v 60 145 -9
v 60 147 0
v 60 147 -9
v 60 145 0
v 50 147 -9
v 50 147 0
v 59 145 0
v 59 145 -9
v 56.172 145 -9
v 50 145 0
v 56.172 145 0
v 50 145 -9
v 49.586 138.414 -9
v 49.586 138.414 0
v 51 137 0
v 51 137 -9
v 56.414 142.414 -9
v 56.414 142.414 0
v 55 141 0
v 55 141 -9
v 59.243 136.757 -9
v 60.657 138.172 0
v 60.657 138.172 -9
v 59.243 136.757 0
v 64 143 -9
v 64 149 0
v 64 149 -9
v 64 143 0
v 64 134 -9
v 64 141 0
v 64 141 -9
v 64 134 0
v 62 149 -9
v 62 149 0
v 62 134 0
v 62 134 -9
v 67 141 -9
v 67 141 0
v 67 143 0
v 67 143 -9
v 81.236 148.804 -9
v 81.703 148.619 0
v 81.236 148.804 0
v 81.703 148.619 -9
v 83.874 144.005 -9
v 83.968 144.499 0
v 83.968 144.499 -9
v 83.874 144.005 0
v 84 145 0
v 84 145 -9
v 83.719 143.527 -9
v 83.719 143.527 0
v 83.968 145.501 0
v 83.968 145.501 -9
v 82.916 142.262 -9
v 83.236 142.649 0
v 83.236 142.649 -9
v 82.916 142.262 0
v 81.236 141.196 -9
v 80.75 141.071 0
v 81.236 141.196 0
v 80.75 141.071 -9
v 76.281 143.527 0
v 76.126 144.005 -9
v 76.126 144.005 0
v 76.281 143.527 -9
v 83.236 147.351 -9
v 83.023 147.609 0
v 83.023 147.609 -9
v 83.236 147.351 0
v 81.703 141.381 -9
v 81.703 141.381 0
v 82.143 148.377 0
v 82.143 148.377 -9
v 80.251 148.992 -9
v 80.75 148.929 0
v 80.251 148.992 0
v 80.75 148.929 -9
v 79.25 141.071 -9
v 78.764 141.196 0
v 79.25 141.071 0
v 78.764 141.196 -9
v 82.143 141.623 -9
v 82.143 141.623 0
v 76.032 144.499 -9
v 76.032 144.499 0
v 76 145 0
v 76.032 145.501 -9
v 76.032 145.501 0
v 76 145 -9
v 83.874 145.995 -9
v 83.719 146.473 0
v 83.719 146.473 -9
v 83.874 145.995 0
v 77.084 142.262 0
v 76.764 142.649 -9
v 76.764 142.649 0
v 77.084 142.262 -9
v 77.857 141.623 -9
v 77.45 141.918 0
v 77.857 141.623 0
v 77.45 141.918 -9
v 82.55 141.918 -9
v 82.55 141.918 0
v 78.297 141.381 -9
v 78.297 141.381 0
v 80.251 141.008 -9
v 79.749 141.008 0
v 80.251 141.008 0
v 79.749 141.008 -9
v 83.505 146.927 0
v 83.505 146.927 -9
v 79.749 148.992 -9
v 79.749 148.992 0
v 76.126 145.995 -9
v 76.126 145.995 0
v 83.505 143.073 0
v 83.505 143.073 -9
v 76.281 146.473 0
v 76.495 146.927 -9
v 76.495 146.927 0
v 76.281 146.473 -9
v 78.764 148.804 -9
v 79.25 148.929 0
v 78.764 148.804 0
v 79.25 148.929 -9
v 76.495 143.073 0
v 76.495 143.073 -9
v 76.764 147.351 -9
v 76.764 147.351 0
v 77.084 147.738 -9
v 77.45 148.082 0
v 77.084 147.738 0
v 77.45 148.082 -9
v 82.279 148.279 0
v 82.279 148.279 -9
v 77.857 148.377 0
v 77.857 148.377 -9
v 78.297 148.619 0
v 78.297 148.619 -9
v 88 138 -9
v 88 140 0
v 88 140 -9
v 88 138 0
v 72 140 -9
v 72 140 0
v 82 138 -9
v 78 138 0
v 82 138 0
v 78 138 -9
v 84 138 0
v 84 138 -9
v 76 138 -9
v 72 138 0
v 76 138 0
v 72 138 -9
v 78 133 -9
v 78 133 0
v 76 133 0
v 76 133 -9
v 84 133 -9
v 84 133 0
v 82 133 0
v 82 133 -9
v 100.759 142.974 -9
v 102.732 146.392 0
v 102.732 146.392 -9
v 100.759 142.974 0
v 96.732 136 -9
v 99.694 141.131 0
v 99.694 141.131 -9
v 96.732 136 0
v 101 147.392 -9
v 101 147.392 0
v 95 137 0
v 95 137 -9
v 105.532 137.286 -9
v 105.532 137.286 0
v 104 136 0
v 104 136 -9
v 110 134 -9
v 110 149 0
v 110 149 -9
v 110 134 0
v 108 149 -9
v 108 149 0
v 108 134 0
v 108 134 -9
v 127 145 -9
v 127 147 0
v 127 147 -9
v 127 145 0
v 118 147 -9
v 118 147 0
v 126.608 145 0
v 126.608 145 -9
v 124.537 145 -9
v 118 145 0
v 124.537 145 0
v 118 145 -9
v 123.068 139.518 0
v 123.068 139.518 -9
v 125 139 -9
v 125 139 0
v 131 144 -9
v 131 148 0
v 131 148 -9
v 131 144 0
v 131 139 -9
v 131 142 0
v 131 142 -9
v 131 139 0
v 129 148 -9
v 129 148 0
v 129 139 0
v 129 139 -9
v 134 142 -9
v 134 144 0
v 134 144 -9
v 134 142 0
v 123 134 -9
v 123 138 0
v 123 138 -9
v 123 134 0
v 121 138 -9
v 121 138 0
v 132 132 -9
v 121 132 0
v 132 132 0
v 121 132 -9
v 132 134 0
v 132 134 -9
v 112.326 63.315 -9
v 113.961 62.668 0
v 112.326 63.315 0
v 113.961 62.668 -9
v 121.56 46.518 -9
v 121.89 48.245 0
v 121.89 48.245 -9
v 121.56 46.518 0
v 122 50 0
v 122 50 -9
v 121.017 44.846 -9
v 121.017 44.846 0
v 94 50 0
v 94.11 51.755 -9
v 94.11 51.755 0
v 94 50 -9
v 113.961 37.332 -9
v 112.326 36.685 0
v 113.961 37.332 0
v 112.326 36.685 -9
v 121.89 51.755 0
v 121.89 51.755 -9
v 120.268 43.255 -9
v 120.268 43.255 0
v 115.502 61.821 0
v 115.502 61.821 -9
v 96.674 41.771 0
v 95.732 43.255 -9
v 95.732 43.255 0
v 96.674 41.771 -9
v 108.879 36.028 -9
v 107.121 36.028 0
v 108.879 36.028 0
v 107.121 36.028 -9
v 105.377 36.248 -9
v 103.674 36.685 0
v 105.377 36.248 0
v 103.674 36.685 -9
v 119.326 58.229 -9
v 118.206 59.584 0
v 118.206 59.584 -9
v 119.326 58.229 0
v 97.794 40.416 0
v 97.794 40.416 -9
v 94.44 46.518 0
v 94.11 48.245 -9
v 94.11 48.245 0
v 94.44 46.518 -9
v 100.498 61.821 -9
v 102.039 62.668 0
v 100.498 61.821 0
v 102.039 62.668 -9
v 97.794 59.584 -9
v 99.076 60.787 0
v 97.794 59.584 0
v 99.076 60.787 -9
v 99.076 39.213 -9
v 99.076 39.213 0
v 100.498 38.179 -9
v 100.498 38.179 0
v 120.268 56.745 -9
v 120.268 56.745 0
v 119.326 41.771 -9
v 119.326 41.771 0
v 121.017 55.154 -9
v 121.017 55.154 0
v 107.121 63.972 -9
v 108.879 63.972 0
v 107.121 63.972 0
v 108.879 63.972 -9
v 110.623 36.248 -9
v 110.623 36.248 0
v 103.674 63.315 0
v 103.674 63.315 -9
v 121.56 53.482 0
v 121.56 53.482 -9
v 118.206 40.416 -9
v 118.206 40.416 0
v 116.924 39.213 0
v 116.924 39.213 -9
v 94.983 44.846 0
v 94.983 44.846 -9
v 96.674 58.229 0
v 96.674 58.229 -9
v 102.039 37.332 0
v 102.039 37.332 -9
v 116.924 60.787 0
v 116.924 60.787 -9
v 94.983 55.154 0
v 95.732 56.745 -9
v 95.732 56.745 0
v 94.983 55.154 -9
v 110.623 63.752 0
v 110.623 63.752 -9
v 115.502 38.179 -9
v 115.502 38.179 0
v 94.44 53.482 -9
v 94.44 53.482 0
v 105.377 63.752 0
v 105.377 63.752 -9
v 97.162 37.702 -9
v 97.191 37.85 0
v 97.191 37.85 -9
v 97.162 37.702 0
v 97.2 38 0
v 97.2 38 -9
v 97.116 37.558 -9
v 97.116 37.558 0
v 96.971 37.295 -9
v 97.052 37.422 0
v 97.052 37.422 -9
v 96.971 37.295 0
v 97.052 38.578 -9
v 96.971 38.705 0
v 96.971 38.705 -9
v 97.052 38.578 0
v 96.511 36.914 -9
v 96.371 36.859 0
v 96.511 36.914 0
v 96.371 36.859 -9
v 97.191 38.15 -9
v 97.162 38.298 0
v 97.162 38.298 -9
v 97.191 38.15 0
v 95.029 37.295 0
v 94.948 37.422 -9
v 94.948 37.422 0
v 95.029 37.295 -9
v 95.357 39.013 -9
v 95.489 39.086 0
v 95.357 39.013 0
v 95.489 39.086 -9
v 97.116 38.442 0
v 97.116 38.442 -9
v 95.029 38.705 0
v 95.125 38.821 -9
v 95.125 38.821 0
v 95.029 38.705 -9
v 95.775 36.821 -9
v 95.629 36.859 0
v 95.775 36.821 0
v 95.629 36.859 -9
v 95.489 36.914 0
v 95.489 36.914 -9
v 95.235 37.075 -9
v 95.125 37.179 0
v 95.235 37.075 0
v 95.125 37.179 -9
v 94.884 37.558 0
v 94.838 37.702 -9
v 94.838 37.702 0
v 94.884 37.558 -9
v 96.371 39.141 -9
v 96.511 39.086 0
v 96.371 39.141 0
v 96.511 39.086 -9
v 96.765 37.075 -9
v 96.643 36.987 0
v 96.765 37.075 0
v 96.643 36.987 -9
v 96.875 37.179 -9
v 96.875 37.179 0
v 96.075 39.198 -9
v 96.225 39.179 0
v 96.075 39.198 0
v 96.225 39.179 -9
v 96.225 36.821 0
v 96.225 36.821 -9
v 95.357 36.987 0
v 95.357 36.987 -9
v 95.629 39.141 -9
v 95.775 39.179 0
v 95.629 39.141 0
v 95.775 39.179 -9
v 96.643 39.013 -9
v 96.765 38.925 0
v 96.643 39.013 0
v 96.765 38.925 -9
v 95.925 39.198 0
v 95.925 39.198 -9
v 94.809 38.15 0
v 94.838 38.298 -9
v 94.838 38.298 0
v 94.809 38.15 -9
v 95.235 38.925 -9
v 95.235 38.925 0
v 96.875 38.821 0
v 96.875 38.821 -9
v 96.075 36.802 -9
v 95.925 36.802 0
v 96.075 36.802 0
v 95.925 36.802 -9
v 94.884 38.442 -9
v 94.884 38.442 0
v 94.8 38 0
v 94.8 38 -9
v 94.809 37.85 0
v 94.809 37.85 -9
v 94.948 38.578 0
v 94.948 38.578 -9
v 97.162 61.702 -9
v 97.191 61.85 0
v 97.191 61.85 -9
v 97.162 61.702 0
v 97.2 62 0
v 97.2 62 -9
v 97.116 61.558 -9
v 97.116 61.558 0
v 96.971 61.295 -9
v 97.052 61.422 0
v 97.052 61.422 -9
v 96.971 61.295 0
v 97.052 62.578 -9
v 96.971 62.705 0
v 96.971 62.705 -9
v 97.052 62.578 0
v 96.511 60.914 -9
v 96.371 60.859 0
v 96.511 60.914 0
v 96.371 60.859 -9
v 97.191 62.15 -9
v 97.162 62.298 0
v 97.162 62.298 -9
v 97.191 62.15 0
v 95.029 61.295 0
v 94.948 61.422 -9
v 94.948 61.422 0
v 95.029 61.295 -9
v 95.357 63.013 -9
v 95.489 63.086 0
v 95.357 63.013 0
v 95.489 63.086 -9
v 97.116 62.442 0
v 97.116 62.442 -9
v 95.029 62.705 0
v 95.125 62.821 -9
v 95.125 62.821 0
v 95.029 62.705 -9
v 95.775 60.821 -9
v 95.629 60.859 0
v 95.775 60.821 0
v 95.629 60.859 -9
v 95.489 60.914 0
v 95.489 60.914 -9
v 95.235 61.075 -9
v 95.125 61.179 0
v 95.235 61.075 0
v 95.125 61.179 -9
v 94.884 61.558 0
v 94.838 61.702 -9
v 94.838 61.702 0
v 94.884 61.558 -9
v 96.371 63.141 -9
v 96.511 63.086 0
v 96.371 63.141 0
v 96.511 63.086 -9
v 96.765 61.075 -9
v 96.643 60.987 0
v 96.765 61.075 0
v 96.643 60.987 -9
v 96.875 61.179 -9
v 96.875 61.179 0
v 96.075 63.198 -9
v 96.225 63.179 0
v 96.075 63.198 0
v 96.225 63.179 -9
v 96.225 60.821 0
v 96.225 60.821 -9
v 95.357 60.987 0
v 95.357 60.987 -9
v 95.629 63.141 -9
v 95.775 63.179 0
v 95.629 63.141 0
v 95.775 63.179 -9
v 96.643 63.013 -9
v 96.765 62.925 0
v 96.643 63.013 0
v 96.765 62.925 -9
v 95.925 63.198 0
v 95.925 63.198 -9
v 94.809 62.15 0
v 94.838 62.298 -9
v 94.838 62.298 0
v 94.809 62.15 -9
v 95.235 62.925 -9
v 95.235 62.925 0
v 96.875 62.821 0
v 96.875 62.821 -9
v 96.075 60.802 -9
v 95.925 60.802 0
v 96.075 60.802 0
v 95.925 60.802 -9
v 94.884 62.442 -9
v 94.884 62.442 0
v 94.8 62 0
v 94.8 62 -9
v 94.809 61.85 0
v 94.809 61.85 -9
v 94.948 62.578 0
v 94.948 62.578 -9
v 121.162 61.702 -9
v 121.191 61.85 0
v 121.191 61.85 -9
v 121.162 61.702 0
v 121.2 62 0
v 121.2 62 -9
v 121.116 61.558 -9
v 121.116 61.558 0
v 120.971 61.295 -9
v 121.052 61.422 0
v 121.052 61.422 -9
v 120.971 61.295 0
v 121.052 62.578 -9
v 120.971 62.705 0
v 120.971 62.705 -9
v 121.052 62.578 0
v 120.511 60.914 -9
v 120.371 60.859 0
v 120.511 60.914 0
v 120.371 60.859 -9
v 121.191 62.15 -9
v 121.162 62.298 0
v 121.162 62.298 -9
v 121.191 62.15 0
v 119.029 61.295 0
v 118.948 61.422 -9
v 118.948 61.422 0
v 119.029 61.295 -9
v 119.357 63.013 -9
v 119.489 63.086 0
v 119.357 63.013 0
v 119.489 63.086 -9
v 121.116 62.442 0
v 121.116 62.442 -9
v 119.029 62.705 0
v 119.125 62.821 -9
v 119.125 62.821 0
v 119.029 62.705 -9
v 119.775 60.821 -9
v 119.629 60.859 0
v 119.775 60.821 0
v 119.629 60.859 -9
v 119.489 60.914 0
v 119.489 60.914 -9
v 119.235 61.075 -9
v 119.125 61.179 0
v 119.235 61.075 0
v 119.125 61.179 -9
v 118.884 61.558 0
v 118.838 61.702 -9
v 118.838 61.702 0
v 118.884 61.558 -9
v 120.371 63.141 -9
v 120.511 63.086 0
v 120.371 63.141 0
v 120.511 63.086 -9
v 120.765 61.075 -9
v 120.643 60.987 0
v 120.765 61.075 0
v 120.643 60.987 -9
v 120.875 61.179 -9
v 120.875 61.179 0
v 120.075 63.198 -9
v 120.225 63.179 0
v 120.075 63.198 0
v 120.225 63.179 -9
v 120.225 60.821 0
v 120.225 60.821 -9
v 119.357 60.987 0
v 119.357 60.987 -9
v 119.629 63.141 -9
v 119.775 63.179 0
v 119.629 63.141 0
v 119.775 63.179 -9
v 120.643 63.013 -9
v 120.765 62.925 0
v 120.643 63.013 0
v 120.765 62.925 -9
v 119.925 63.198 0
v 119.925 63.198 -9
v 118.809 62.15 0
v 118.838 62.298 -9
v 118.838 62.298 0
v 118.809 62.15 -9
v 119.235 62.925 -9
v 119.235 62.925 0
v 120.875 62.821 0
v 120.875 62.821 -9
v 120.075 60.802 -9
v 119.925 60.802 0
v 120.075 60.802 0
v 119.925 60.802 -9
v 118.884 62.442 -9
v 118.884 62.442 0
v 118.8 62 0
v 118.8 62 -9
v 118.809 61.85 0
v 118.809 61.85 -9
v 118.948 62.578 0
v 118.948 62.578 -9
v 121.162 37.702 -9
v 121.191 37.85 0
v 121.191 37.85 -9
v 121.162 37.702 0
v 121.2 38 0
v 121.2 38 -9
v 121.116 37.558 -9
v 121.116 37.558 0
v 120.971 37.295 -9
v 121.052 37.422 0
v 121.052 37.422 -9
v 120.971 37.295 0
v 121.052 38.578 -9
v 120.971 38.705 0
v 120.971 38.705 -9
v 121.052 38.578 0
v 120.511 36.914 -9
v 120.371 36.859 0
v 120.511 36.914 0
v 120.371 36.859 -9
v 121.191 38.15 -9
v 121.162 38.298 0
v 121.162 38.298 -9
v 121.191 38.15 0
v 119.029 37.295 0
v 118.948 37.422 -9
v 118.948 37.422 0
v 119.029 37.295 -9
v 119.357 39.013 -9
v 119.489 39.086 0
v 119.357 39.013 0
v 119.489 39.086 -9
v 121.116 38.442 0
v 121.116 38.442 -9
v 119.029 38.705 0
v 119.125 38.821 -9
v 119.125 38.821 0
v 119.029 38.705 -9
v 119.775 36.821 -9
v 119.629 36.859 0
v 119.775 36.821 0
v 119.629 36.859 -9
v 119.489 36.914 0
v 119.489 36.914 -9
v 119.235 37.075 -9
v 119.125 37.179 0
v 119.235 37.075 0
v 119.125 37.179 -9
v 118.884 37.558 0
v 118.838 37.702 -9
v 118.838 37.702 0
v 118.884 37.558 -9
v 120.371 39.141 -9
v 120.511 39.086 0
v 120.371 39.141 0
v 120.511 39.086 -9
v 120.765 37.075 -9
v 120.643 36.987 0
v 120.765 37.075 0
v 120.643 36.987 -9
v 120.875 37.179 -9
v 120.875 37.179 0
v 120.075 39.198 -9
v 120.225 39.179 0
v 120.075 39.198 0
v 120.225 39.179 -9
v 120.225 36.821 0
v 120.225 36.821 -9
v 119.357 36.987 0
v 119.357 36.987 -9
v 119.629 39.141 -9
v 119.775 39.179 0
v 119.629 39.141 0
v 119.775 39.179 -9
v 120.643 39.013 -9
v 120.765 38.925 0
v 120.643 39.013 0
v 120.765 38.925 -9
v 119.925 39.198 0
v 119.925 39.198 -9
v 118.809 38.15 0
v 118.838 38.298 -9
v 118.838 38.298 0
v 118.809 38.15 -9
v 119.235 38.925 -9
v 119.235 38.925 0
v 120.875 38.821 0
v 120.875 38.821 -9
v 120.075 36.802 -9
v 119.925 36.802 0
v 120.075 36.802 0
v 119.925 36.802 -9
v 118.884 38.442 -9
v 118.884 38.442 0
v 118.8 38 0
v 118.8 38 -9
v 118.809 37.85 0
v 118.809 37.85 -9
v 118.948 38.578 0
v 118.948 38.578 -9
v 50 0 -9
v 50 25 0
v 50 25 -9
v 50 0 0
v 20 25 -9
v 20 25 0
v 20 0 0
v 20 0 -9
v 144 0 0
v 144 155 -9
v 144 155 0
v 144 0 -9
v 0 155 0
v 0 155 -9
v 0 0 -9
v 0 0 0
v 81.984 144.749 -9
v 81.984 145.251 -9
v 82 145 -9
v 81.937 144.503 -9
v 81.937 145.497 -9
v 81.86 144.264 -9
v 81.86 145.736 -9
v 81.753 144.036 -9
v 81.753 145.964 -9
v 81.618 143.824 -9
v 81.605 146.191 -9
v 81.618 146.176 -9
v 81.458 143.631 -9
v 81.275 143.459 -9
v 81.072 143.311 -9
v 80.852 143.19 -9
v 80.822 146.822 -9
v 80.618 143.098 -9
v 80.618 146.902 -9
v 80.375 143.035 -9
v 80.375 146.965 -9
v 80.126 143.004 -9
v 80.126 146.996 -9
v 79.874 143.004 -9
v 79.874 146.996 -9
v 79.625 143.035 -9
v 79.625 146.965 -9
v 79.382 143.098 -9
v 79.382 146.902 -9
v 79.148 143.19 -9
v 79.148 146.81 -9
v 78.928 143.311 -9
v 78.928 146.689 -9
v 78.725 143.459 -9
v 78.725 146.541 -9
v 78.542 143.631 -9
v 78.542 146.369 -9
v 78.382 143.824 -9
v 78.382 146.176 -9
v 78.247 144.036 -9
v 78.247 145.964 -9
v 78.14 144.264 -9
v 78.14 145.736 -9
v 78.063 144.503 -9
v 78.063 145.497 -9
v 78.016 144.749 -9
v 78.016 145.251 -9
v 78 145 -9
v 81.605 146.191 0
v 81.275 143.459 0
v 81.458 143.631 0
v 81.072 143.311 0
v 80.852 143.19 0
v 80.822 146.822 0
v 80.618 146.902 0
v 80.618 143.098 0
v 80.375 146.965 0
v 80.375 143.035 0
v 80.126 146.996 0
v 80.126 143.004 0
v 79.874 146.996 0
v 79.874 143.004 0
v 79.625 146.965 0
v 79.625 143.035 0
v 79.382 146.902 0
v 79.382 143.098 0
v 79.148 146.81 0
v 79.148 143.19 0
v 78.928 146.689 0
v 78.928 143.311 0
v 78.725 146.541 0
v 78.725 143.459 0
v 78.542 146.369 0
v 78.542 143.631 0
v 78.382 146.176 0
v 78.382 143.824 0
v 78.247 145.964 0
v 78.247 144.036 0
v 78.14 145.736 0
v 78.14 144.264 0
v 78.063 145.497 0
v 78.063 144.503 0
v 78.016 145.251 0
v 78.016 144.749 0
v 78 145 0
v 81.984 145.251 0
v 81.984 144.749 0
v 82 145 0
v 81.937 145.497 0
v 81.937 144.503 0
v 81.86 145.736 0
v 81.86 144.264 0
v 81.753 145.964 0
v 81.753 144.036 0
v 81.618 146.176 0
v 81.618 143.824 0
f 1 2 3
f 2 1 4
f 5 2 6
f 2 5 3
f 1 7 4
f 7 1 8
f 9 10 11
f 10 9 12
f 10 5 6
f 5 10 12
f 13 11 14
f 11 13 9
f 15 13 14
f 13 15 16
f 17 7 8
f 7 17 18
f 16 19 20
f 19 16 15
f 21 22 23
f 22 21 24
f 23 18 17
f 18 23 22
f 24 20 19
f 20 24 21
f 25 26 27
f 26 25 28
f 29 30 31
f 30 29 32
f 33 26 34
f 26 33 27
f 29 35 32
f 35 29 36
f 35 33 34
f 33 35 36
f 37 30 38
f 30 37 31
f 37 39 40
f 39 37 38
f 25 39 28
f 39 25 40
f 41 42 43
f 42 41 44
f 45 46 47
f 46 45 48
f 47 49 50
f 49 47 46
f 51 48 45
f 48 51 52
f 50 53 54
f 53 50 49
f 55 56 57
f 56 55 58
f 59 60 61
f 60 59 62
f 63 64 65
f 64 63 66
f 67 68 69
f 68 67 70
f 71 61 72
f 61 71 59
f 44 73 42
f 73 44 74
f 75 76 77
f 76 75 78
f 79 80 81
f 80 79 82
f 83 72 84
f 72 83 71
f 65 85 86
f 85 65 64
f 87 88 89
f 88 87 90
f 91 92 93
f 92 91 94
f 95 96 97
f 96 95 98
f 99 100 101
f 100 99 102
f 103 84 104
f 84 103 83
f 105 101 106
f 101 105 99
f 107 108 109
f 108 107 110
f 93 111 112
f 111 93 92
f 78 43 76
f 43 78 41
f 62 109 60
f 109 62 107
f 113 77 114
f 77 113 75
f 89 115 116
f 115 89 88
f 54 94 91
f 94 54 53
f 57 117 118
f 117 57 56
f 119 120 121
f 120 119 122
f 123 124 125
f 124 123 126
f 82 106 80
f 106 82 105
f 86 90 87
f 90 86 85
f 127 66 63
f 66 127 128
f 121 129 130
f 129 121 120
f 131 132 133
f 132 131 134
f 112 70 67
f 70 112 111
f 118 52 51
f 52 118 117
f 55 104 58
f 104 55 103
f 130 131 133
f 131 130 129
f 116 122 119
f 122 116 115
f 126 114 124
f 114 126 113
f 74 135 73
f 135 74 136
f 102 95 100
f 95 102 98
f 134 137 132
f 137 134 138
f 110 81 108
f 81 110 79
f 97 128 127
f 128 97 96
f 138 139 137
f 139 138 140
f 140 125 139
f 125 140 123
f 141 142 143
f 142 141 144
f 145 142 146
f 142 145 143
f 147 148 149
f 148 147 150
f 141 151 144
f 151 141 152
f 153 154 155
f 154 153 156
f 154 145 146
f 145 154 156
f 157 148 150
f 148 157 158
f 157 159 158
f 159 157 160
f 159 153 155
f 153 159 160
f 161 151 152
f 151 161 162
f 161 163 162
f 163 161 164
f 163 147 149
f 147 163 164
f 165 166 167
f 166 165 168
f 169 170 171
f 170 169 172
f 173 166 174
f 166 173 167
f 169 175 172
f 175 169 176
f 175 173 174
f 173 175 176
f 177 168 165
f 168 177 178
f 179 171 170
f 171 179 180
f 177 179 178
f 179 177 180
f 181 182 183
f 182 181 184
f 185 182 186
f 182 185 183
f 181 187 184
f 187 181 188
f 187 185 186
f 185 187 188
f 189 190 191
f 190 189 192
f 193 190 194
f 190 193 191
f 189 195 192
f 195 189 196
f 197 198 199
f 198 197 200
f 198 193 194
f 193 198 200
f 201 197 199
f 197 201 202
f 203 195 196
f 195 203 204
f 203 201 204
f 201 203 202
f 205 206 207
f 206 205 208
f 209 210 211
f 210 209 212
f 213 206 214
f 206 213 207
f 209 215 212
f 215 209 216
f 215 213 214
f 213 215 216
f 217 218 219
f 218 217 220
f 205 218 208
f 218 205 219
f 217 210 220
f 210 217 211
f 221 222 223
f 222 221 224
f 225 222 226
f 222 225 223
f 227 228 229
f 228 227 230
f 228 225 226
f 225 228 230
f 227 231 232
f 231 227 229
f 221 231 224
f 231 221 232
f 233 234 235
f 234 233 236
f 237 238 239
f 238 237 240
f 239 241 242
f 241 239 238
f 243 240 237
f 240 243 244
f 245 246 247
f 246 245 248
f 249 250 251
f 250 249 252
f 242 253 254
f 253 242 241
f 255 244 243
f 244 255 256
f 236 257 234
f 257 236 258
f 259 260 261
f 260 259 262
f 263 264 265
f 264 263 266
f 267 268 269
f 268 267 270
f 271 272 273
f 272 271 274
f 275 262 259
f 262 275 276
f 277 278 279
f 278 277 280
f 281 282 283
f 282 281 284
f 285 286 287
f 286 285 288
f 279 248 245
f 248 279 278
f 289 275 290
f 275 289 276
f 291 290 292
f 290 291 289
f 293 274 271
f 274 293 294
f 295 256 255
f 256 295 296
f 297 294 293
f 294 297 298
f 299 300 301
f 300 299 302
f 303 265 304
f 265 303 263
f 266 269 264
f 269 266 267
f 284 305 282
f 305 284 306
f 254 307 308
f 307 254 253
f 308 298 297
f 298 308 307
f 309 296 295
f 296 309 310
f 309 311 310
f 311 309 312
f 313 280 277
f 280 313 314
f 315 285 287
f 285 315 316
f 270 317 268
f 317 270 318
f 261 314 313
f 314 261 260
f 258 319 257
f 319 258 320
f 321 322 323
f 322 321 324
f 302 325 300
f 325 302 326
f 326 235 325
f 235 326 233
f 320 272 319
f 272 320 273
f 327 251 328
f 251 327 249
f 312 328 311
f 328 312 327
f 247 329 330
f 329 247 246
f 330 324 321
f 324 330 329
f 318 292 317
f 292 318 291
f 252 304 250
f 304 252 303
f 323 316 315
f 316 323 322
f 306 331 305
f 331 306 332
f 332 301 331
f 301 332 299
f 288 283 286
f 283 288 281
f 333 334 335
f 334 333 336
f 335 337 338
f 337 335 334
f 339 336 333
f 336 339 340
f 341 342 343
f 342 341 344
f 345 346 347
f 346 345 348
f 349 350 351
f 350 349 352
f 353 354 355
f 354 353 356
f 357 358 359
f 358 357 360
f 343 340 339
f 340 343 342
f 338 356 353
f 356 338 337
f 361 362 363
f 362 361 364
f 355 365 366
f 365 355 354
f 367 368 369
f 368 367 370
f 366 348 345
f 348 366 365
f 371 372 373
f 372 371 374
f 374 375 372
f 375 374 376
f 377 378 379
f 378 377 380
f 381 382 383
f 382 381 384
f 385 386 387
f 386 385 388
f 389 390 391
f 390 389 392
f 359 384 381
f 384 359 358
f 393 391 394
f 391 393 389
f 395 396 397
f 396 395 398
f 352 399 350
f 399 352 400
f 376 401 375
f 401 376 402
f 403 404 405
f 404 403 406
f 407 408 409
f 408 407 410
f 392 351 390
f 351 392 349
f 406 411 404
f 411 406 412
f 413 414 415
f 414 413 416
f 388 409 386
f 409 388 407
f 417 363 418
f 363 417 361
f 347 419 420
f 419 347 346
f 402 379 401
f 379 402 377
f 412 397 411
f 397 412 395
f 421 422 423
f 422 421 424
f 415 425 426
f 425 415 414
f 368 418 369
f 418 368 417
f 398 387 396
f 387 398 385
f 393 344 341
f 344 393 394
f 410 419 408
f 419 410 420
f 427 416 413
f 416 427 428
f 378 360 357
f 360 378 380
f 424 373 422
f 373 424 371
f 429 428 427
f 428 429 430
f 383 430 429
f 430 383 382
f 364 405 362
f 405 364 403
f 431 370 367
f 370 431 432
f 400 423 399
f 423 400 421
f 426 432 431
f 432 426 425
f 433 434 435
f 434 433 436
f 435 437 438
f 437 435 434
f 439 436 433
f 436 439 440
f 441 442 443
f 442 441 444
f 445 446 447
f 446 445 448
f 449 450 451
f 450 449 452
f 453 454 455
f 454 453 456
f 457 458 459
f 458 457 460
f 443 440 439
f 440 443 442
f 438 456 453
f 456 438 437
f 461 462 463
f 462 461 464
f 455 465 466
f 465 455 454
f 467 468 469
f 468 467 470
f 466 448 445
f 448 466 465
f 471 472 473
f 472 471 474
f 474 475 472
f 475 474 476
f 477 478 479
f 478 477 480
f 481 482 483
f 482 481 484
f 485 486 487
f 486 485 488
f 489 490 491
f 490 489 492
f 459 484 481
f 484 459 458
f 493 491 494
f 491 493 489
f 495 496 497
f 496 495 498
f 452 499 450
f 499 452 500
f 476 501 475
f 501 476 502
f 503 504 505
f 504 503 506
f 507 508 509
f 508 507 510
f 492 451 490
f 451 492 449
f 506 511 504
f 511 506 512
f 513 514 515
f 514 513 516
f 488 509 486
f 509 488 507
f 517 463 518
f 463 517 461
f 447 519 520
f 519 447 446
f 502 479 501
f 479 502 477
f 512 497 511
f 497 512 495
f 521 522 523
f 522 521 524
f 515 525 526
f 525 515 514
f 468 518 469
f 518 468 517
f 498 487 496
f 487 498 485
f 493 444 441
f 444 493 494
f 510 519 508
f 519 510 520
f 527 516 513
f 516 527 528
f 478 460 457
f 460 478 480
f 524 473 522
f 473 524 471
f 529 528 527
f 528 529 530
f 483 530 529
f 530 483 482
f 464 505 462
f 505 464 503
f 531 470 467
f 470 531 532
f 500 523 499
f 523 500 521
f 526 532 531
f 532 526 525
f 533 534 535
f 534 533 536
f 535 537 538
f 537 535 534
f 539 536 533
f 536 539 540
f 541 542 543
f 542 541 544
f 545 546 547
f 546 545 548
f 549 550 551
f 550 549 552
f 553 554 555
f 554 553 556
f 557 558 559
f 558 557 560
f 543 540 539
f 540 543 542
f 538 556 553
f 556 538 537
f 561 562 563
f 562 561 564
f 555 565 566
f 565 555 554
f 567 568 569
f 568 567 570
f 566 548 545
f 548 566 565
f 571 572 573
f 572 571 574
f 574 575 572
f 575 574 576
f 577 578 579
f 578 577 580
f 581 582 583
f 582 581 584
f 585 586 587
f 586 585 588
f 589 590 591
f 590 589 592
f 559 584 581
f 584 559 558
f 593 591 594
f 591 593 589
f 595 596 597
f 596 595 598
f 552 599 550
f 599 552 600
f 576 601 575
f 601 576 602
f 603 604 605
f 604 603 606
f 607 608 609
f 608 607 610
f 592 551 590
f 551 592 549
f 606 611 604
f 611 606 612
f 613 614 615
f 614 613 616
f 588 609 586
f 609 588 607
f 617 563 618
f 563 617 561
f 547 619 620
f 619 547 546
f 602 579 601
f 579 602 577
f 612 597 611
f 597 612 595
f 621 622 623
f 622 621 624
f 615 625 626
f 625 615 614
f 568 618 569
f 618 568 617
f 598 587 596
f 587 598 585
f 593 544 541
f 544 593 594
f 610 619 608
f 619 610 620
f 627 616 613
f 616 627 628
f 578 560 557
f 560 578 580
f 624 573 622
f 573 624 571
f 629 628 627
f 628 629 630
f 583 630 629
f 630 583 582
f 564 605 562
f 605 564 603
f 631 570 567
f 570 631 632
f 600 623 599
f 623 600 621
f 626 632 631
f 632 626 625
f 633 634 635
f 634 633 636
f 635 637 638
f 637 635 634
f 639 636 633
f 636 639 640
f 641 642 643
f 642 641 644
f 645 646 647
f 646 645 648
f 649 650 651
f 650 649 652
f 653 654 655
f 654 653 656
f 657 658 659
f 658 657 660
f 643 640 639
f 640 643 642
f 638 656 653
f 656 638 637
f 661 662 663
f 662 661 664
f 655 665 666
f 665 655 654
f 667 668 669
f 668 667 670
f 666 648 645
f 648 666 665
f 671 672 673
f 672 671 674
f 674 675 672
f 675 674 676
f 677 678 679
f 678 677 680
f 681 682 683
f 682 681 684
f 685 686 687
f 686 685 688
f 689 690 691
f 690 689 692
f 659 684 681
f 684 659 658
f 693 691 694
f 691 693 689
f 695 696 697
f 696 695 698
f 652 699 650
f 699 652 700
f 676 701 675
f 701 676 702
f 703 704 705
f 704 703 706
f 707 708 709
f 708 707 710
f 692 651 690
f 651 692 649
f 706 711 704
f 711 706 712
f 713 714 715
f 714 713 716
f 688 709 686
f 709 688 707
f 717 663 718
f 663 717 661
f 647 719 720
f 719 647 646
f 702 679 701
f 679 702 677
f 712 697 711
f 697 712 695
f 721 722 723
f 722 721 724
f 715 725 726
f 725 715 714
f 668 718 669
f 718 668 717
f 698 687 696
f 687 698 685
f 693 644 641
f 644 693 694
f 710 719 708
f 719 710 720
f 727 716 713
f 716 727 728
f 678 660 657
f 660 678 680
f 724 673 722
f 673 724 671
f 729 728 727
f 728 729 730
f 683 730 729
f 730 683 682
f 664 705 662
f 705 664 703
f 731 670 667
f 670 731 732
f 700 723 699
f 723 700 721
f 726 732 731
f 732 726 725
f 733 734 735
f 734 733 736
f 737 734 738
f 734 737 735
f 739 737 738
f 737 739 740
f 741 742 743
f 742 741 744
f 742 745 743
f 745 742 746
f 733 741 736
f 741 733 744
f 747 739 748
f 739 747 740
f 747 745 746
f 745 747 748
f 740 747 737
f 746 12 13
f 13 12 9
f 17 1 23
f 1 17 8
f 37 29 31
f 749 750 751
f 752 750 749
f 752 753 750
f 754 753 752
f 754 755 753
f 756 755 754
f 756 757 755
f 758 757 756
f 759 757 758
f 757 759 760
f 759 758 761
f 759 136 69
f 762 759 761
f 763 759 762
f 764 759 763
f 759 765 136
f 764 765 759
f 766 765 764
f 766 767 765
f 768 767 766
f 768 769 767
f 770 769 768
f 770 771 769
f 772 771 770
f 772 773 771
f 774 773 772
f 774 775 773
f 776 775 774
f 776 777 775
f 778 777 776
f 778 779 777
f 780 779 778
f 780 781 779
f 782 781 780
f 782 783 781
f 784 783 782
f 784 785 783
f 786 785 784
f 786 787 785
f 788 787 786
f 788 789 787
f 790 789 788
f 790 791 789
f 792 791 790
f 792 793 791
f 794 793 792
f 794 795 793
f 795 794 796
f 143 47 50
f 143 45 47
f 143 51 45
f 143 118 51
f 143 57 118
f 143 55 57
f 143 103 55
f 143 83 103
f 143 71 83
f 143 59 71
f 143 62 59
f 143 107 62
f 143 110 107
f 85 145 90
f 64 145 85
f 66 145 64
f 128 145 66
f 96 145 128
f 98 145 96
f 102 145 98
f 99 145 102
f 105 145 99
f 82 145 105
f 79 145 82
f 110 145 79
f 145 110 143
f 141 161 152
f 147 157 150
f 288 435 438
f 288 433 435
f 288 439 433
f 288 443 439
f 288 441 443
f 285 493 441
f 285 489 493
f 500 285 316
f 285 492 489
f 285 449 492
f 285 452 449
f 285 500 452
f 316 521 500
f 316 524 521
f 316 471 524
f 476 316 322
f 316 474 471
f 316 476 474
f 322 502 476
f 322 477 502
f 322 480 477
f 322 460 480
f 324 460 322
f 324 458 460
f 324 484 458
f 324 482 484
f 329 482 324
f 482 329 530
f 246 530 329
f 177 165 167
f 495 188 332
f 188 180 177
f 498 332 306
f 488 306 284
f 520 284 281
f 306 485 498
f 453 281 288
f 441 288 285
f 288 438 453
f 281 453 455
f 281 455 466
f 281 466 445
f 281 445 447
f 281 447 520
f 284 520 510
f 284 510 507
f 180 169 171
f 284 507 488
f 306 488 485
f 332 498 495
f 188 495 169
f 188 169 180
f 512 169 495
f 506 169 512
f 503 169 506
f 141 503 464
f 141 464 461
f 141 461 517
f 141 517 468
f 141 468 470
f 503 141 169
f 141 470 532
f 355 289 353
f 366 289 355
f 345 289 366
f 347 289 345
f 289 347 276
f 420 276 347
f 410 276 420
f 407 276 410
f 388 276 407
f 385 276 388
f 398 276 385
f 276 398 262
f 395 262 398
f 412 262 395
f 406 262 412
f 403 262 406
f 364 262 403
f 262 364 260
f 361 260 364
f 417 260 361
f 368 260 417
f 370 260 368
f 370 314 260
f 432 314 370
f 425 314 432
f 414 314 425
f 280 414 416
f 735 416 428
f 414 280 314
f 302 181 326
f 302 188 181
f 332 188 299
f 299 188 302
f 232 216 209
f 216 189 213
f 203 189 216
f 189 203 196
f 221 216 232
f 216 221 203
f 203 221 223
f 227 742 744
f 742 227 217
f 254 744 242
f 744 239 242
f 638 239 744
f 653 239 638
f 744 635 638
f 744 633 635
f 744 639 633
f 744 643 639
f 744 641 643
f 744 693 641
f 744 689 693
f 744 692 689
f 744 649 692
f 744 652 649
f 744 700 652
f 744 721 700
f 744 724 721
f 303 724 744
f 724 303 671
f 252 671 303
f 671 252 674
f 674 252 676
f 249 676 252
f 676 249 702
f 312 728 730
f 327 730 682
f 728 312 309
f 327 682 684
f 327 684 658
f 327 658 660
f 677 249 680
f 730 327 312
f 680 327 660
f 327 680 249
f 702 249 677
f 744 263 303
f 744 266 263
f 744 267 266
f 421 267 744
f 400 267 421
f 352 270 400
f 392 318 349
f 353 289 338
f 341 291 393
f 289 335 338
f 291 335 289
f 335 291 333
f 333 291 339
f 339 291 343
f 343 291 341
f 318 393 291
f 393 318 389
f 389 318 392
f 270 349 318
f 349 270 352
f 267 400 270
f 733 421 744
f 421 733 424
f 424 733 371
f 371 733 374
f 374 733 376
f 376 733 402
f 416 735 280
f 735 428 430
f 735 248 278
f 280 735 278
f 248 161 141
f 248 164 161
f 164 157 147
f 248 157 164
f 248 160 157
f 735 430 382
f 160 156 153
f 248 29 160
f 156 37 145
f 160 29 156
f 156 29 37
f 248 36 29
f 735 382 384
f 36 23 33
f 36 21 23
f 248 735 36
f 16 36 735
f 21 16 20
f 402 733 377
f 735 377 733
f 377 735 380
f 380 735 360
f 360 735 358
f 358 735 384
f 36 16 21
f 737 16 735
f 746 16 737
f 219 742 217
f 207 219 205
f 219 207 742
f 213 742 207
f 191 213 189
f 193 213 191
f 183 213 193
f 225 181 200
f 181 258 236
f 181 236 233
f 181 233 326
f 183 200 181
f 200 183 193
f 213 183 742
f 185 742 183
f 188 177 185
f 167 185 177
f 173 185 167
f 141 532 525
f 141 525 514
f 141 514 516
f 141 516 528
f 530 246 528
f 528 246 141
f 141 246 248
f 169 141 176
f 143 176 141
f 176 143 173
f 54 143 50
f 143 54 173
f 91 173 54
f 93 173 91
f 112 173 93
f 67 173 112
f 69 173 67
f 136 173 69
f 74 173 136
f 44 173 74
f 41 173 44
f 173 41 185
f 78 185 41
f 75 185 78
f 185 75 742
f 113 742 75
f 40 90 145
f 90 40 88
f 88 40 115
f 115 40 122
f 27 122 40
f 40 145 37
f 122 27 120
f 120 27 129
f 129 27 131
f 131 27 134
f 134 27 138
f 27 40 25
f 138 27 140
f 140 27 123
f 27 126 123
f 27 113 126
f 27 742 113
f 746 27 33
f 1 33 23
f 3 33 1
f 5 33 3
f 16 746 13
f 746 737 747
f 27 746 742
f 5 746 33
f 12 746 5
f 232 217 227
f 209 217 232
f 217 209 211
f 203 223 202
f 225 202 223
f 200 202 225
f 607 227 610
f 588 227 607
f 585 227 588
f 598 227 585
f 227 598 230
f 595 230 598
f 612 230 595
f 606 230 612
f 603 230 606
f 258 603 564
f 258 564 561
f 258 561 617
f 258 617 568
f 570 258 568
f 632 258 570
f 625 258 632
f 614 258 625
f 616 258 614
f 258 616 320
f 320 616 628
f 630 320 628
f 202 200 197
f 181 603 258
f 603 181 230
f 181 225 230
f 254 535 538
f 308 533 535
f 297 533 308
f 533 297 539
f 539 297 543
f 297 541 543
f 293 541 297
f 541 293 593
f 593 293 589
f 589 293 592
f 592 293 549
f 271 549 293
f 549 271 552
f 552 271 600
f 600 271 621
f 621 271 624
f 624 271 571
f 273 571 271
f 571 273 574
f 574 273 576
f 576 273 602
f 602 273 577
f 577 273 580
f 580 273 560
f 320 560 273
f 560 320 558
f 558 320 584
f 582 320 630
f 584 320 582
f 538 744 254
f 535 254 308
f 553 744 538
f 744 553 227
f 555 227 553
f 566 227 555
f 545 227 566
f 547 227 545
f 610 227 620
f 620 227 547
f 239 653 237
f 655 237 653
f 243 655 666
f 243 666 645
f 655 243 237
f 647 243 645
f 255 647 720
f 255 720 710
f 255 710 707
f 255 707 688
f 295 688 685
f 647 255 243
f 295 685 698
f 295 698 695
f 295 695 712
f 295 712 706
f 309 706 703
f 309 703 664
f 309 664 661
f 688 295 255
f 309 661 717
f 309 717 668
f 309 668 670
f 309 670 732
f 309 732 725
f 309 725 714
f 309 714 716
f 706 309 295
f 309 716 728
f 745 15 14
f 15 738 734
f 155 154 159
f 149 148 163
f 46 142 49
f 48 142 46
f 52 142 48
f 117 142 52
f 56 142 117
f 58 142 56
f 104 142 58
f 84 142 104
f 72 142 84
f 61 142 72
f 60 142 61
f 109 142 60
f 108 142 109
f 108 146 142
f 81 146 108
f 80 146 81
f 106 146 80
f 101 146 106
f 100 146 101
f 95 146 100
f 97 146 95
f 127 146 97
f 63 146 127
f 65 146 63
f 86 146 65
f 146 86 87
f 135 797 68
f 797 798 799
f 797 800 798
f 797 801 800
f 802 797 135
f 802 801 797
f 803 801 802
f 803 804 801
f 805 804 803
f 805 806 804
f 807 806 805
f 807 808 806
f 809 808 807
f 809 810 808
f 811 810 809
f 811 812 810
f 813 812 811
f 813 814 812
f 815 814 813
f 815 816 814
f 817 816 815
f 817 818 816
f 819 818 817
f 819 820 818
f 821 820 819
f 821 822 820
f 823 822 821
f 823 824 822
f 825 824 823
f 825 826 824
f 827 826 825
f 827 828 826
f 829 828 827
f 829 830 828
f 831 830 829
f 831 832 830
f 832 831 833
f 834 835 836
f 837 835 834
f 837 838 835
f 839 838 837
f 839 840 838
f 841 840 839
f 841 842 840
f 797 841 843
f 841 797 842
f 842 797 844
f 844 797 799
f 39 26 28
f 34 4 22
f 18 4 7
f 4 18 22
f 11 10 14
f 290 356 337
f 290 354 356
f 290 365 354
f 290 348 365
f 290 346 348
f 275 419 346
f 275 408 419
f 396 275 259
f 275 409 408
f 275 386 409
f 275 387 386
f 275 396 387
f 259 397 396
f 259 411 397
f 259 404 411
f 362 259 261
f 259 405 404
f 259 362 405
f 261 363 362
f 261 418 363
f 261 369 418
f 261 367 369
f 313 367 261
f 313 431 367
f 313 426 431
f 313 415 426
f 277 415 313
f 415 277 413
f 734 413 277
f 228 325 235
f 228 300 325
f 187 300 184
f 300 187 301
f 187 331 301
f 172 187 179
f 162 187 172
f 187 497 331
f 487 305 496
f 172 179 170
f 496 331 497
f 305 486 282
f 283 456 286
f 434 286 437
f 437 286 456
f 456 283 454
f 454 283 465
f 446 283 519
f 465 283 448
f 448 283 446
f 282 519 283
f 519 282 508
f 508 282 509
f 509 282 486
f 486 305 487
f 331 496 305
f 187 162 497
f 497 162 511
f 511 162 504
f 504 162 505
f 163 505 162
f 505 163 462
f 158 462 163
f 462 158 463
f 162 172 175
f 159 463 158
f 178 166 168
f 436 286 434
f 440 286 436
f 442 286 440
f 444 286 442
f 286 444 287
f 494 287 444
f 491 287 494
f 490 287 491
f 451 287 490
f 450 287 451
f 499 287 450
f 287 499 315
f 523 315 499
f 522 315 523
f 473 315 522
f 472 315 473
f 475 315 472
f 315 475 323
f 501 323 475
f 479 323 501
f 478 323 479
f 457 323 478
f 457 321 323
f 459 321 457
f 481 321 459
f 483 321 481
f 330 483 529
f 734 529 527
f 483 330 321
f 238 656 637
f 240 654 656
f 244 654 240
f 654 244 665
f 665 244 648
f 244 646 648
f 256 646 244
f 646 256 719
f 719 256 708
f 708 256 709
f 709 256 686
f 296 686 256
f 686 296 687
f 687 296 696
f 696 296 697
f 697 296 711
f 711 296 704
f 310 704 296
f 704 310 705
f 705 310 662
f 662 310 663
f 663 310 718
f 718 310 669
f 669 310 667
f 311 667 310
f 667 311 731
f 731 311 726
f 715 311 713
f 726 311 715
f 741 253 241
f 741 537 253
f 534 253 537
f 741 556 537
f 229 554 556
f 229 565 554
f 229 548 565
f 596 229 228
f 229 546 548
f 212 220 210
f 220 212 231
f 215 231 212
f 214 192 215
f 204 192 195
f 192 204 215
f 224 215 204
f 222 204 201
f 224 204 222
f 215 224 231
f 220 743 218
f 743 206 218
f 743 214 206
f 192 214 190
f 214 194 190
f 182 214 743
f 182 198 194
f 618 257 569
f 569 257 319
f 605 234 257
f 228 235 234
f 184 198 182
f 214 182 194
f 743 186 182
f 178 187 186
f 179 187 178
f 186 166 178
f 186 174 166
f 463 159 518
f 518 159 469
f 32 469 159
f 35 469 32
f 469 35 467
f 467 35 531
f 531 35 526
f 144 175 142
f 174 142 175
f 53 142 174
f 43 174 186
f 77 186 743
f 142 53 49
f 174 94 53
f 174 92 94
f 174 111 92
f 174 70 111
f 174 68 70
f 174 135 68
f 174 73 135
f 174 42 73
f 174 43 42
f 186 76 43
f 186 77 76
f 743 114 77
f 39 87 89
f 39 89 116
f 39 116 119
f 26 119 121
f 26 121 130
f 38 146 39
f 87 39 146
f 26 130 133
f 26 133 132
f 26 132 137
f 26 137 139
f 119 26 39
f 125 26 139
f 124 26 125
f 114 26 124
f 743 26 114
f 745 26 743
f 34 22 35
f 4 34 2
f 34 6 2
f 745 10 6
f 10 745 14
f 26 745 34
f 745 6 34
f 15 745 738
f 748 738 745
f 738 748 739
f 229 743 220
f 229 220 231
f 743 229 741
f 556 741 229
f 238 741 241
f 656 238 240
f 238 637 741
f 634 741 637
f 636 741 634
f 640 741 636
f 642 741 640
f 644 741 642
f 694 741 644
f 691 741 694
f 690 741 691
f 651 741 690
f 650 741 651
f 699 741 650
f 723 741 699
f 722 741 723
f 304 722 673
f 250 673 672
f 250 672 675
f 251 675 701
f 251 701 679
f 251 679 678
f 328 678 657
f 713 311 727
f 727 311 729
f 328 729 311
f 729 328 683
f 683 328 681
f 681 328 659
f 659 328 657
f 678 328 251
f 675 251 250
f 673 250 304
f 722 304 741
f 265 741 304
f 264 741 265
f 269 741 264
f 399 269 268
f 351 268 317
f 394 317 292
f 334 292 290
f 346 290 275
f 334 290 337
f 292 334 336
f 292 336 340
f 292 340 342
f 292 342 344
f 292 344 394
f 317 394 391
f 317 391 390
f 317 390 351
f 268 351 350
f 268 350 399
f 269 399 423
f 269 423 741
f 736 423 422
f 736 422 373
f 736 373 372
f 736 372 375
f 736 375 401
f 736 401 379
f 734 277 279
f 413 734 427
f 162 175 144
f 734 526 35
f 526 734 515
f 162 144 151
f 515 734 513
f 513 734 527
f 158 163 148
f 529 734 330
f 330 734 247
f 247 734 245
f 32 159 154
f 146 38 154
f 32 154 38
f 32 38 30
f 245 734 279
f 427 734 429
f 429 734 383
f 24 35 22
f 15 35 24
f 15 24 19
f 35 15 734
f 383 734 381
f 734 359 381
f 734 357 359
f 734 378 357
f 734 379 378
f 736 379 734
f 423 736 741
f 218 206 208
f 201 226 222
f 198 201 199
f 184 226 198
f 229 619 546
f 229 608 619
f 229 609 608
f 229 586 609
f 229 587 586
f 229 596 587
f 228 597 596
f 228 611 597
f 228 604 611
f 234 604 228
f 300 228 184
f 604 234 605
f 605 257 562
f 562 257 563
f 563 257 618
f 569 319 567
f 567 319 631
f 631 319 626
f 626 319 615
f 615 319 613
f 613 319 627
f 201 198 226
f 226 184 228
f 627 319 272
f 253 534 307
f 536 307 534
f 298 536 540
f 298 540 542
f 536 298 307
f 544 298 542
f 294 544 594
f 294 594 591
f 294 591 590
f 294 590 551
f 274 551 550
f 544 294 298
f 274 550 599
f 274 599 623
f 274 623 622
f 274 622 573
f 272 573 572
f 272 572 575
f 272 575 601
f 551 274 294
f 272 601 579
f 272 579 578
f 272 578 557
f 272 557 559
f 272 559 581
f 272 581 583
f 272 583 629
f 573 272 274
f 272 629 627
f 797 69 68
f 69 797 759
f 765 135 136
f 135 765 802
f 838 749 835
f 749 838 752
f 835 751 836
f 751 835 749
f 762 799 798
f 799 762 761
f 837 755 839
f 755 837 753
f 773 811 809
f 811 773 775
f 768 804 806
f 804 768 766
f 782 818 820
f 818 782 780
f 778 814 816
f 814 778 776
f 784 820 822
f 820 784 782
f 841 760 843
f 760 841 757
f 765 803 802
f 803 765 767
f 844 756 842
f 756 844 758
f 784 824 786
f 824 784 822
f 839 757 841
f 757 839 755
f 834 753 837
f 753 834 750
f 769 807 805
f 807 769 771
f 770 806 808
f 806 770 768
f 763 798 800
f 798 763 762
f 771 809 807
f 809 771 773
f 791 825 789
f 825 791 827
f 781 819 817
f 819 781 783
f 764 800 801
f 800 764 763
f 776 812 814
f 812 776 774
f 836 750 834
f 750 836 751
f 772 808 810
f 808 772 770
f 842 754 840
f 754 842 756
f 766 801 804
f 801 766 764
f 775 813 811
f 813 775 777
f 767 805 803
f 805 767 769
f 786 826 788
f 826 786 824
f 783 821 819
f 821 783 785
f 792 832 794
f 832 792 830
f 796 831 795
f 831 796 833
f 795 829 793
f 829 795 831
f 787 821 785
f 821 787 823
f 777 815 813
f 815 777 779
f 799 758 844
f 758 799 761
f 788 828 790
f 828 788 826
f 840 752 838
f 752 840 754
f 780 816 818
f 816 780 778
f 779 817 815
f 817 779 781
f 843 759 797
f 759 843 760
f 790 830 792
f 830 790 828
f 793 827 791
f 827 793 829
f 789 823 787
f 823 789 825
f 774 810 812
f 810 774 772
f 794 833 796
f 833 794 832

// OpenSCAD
rotate(a=90,v=[-1,0,0]) {
difference() {
    cube([144,9,155]);
    
    union() {
        translate([40,0,0])
        union() {
        union() {
            translate([10,-1,145])
            cube([10,11,2]);
            translate([11,-1,137])
            rotate(a=45,v=[0,-1,0]) {
                cube([12,11,2]);
            }
            translate([15,-1,141])
            rotate(a=45,v=[0,1,0]) {
                cube([6,11,2]);
            }
            translate([22,-1,134])
            cube([2,11,15]);
            translate([22,-1,143])
            rotate(a=90,v=[0,1,0]) {
                cube([2,11,5]);
            }
        }
        
        union() {
            translate([40,-1,145])
            rotate(a=90,v=[-1,0,0]) {
                cylinder(r=4,h=11,$fn=50);
            }
            translate([32,-1,138])
            cube([16,11,2]);
            translate([36,-1,133])
            cube([2,11,5]);
            translate([42,-1,133])
            cube([2,11,5]);
        }
        
        union() {
            translate([55,-1,137])
            rotate(a=30,v=[0,1,0]) {
                cube([2,11,12]);
            }
            translate([64,-1,136])
            rotate(a=40,v=[0,-1,0]) {
                cube([2,11,8]);
            }
            translate([68,-1,134])
            cube([2,11,15]);
        }
        
        union() {
            translate([78,-1,145])
            cube([9,11,2]);
            translate([85,-1,139])
            rotate(a=75,v=[0,-1,0]) {
                cube([7,11,2]);
            }
            translate([89,-1,139])
            cube([2,11,9]);
            translate([89,-1,142])
            cube([5,11,2]);
            translate([81,-1,132])
            cube([2,11,6]);
            translate([81,-1,132])
            cube([11,11,2]);
        }
    }
        
        // translate([72,-1,140])
        // rotate(a=90,v=[-1,0,0]) {
        //     cylinder(r=10,h=11,$fn=50);
        // }
        
        translate([108,-1,50])
        rotate(a=90,v=[-1,0,0]) {
            cylinder(r=14,h=11,$fn=50);
        }
        
        translate([96,-1,38])
        rotate(a=90,v=[-1,0,0]) {
            cylinder(r=1.2,h=11,$fn=50);
        }
        translate([96,-1,62])
        rotate(a=90,v=[-1,0,0]) {
            cylinder(r=1.2,h=11,$fn=50);
        }
        translate([120,-1,62])
        rotate(a=90,v=[-1,0,0]) {
            cylinder(r=1.2,h=11,$fn=50);
        }
        translate([120,-1,38])
        rotate(a=90,v=[-1,0,0]) {
            cylinder(r=1.2,h=11,$fn=50);
        }
        
        translate([20,-1,-1])
        cube([30,11,26]);
    }
}

translate([80,0,146])
rotate(a=45,v=[0,1,0]) {
    cube([1,9,4]);
}
translate([80,0,145])
rotate(a=90,v=[-1,0,0]) {
    cylinder(r=2,h=9,$fn=50);
}
}
